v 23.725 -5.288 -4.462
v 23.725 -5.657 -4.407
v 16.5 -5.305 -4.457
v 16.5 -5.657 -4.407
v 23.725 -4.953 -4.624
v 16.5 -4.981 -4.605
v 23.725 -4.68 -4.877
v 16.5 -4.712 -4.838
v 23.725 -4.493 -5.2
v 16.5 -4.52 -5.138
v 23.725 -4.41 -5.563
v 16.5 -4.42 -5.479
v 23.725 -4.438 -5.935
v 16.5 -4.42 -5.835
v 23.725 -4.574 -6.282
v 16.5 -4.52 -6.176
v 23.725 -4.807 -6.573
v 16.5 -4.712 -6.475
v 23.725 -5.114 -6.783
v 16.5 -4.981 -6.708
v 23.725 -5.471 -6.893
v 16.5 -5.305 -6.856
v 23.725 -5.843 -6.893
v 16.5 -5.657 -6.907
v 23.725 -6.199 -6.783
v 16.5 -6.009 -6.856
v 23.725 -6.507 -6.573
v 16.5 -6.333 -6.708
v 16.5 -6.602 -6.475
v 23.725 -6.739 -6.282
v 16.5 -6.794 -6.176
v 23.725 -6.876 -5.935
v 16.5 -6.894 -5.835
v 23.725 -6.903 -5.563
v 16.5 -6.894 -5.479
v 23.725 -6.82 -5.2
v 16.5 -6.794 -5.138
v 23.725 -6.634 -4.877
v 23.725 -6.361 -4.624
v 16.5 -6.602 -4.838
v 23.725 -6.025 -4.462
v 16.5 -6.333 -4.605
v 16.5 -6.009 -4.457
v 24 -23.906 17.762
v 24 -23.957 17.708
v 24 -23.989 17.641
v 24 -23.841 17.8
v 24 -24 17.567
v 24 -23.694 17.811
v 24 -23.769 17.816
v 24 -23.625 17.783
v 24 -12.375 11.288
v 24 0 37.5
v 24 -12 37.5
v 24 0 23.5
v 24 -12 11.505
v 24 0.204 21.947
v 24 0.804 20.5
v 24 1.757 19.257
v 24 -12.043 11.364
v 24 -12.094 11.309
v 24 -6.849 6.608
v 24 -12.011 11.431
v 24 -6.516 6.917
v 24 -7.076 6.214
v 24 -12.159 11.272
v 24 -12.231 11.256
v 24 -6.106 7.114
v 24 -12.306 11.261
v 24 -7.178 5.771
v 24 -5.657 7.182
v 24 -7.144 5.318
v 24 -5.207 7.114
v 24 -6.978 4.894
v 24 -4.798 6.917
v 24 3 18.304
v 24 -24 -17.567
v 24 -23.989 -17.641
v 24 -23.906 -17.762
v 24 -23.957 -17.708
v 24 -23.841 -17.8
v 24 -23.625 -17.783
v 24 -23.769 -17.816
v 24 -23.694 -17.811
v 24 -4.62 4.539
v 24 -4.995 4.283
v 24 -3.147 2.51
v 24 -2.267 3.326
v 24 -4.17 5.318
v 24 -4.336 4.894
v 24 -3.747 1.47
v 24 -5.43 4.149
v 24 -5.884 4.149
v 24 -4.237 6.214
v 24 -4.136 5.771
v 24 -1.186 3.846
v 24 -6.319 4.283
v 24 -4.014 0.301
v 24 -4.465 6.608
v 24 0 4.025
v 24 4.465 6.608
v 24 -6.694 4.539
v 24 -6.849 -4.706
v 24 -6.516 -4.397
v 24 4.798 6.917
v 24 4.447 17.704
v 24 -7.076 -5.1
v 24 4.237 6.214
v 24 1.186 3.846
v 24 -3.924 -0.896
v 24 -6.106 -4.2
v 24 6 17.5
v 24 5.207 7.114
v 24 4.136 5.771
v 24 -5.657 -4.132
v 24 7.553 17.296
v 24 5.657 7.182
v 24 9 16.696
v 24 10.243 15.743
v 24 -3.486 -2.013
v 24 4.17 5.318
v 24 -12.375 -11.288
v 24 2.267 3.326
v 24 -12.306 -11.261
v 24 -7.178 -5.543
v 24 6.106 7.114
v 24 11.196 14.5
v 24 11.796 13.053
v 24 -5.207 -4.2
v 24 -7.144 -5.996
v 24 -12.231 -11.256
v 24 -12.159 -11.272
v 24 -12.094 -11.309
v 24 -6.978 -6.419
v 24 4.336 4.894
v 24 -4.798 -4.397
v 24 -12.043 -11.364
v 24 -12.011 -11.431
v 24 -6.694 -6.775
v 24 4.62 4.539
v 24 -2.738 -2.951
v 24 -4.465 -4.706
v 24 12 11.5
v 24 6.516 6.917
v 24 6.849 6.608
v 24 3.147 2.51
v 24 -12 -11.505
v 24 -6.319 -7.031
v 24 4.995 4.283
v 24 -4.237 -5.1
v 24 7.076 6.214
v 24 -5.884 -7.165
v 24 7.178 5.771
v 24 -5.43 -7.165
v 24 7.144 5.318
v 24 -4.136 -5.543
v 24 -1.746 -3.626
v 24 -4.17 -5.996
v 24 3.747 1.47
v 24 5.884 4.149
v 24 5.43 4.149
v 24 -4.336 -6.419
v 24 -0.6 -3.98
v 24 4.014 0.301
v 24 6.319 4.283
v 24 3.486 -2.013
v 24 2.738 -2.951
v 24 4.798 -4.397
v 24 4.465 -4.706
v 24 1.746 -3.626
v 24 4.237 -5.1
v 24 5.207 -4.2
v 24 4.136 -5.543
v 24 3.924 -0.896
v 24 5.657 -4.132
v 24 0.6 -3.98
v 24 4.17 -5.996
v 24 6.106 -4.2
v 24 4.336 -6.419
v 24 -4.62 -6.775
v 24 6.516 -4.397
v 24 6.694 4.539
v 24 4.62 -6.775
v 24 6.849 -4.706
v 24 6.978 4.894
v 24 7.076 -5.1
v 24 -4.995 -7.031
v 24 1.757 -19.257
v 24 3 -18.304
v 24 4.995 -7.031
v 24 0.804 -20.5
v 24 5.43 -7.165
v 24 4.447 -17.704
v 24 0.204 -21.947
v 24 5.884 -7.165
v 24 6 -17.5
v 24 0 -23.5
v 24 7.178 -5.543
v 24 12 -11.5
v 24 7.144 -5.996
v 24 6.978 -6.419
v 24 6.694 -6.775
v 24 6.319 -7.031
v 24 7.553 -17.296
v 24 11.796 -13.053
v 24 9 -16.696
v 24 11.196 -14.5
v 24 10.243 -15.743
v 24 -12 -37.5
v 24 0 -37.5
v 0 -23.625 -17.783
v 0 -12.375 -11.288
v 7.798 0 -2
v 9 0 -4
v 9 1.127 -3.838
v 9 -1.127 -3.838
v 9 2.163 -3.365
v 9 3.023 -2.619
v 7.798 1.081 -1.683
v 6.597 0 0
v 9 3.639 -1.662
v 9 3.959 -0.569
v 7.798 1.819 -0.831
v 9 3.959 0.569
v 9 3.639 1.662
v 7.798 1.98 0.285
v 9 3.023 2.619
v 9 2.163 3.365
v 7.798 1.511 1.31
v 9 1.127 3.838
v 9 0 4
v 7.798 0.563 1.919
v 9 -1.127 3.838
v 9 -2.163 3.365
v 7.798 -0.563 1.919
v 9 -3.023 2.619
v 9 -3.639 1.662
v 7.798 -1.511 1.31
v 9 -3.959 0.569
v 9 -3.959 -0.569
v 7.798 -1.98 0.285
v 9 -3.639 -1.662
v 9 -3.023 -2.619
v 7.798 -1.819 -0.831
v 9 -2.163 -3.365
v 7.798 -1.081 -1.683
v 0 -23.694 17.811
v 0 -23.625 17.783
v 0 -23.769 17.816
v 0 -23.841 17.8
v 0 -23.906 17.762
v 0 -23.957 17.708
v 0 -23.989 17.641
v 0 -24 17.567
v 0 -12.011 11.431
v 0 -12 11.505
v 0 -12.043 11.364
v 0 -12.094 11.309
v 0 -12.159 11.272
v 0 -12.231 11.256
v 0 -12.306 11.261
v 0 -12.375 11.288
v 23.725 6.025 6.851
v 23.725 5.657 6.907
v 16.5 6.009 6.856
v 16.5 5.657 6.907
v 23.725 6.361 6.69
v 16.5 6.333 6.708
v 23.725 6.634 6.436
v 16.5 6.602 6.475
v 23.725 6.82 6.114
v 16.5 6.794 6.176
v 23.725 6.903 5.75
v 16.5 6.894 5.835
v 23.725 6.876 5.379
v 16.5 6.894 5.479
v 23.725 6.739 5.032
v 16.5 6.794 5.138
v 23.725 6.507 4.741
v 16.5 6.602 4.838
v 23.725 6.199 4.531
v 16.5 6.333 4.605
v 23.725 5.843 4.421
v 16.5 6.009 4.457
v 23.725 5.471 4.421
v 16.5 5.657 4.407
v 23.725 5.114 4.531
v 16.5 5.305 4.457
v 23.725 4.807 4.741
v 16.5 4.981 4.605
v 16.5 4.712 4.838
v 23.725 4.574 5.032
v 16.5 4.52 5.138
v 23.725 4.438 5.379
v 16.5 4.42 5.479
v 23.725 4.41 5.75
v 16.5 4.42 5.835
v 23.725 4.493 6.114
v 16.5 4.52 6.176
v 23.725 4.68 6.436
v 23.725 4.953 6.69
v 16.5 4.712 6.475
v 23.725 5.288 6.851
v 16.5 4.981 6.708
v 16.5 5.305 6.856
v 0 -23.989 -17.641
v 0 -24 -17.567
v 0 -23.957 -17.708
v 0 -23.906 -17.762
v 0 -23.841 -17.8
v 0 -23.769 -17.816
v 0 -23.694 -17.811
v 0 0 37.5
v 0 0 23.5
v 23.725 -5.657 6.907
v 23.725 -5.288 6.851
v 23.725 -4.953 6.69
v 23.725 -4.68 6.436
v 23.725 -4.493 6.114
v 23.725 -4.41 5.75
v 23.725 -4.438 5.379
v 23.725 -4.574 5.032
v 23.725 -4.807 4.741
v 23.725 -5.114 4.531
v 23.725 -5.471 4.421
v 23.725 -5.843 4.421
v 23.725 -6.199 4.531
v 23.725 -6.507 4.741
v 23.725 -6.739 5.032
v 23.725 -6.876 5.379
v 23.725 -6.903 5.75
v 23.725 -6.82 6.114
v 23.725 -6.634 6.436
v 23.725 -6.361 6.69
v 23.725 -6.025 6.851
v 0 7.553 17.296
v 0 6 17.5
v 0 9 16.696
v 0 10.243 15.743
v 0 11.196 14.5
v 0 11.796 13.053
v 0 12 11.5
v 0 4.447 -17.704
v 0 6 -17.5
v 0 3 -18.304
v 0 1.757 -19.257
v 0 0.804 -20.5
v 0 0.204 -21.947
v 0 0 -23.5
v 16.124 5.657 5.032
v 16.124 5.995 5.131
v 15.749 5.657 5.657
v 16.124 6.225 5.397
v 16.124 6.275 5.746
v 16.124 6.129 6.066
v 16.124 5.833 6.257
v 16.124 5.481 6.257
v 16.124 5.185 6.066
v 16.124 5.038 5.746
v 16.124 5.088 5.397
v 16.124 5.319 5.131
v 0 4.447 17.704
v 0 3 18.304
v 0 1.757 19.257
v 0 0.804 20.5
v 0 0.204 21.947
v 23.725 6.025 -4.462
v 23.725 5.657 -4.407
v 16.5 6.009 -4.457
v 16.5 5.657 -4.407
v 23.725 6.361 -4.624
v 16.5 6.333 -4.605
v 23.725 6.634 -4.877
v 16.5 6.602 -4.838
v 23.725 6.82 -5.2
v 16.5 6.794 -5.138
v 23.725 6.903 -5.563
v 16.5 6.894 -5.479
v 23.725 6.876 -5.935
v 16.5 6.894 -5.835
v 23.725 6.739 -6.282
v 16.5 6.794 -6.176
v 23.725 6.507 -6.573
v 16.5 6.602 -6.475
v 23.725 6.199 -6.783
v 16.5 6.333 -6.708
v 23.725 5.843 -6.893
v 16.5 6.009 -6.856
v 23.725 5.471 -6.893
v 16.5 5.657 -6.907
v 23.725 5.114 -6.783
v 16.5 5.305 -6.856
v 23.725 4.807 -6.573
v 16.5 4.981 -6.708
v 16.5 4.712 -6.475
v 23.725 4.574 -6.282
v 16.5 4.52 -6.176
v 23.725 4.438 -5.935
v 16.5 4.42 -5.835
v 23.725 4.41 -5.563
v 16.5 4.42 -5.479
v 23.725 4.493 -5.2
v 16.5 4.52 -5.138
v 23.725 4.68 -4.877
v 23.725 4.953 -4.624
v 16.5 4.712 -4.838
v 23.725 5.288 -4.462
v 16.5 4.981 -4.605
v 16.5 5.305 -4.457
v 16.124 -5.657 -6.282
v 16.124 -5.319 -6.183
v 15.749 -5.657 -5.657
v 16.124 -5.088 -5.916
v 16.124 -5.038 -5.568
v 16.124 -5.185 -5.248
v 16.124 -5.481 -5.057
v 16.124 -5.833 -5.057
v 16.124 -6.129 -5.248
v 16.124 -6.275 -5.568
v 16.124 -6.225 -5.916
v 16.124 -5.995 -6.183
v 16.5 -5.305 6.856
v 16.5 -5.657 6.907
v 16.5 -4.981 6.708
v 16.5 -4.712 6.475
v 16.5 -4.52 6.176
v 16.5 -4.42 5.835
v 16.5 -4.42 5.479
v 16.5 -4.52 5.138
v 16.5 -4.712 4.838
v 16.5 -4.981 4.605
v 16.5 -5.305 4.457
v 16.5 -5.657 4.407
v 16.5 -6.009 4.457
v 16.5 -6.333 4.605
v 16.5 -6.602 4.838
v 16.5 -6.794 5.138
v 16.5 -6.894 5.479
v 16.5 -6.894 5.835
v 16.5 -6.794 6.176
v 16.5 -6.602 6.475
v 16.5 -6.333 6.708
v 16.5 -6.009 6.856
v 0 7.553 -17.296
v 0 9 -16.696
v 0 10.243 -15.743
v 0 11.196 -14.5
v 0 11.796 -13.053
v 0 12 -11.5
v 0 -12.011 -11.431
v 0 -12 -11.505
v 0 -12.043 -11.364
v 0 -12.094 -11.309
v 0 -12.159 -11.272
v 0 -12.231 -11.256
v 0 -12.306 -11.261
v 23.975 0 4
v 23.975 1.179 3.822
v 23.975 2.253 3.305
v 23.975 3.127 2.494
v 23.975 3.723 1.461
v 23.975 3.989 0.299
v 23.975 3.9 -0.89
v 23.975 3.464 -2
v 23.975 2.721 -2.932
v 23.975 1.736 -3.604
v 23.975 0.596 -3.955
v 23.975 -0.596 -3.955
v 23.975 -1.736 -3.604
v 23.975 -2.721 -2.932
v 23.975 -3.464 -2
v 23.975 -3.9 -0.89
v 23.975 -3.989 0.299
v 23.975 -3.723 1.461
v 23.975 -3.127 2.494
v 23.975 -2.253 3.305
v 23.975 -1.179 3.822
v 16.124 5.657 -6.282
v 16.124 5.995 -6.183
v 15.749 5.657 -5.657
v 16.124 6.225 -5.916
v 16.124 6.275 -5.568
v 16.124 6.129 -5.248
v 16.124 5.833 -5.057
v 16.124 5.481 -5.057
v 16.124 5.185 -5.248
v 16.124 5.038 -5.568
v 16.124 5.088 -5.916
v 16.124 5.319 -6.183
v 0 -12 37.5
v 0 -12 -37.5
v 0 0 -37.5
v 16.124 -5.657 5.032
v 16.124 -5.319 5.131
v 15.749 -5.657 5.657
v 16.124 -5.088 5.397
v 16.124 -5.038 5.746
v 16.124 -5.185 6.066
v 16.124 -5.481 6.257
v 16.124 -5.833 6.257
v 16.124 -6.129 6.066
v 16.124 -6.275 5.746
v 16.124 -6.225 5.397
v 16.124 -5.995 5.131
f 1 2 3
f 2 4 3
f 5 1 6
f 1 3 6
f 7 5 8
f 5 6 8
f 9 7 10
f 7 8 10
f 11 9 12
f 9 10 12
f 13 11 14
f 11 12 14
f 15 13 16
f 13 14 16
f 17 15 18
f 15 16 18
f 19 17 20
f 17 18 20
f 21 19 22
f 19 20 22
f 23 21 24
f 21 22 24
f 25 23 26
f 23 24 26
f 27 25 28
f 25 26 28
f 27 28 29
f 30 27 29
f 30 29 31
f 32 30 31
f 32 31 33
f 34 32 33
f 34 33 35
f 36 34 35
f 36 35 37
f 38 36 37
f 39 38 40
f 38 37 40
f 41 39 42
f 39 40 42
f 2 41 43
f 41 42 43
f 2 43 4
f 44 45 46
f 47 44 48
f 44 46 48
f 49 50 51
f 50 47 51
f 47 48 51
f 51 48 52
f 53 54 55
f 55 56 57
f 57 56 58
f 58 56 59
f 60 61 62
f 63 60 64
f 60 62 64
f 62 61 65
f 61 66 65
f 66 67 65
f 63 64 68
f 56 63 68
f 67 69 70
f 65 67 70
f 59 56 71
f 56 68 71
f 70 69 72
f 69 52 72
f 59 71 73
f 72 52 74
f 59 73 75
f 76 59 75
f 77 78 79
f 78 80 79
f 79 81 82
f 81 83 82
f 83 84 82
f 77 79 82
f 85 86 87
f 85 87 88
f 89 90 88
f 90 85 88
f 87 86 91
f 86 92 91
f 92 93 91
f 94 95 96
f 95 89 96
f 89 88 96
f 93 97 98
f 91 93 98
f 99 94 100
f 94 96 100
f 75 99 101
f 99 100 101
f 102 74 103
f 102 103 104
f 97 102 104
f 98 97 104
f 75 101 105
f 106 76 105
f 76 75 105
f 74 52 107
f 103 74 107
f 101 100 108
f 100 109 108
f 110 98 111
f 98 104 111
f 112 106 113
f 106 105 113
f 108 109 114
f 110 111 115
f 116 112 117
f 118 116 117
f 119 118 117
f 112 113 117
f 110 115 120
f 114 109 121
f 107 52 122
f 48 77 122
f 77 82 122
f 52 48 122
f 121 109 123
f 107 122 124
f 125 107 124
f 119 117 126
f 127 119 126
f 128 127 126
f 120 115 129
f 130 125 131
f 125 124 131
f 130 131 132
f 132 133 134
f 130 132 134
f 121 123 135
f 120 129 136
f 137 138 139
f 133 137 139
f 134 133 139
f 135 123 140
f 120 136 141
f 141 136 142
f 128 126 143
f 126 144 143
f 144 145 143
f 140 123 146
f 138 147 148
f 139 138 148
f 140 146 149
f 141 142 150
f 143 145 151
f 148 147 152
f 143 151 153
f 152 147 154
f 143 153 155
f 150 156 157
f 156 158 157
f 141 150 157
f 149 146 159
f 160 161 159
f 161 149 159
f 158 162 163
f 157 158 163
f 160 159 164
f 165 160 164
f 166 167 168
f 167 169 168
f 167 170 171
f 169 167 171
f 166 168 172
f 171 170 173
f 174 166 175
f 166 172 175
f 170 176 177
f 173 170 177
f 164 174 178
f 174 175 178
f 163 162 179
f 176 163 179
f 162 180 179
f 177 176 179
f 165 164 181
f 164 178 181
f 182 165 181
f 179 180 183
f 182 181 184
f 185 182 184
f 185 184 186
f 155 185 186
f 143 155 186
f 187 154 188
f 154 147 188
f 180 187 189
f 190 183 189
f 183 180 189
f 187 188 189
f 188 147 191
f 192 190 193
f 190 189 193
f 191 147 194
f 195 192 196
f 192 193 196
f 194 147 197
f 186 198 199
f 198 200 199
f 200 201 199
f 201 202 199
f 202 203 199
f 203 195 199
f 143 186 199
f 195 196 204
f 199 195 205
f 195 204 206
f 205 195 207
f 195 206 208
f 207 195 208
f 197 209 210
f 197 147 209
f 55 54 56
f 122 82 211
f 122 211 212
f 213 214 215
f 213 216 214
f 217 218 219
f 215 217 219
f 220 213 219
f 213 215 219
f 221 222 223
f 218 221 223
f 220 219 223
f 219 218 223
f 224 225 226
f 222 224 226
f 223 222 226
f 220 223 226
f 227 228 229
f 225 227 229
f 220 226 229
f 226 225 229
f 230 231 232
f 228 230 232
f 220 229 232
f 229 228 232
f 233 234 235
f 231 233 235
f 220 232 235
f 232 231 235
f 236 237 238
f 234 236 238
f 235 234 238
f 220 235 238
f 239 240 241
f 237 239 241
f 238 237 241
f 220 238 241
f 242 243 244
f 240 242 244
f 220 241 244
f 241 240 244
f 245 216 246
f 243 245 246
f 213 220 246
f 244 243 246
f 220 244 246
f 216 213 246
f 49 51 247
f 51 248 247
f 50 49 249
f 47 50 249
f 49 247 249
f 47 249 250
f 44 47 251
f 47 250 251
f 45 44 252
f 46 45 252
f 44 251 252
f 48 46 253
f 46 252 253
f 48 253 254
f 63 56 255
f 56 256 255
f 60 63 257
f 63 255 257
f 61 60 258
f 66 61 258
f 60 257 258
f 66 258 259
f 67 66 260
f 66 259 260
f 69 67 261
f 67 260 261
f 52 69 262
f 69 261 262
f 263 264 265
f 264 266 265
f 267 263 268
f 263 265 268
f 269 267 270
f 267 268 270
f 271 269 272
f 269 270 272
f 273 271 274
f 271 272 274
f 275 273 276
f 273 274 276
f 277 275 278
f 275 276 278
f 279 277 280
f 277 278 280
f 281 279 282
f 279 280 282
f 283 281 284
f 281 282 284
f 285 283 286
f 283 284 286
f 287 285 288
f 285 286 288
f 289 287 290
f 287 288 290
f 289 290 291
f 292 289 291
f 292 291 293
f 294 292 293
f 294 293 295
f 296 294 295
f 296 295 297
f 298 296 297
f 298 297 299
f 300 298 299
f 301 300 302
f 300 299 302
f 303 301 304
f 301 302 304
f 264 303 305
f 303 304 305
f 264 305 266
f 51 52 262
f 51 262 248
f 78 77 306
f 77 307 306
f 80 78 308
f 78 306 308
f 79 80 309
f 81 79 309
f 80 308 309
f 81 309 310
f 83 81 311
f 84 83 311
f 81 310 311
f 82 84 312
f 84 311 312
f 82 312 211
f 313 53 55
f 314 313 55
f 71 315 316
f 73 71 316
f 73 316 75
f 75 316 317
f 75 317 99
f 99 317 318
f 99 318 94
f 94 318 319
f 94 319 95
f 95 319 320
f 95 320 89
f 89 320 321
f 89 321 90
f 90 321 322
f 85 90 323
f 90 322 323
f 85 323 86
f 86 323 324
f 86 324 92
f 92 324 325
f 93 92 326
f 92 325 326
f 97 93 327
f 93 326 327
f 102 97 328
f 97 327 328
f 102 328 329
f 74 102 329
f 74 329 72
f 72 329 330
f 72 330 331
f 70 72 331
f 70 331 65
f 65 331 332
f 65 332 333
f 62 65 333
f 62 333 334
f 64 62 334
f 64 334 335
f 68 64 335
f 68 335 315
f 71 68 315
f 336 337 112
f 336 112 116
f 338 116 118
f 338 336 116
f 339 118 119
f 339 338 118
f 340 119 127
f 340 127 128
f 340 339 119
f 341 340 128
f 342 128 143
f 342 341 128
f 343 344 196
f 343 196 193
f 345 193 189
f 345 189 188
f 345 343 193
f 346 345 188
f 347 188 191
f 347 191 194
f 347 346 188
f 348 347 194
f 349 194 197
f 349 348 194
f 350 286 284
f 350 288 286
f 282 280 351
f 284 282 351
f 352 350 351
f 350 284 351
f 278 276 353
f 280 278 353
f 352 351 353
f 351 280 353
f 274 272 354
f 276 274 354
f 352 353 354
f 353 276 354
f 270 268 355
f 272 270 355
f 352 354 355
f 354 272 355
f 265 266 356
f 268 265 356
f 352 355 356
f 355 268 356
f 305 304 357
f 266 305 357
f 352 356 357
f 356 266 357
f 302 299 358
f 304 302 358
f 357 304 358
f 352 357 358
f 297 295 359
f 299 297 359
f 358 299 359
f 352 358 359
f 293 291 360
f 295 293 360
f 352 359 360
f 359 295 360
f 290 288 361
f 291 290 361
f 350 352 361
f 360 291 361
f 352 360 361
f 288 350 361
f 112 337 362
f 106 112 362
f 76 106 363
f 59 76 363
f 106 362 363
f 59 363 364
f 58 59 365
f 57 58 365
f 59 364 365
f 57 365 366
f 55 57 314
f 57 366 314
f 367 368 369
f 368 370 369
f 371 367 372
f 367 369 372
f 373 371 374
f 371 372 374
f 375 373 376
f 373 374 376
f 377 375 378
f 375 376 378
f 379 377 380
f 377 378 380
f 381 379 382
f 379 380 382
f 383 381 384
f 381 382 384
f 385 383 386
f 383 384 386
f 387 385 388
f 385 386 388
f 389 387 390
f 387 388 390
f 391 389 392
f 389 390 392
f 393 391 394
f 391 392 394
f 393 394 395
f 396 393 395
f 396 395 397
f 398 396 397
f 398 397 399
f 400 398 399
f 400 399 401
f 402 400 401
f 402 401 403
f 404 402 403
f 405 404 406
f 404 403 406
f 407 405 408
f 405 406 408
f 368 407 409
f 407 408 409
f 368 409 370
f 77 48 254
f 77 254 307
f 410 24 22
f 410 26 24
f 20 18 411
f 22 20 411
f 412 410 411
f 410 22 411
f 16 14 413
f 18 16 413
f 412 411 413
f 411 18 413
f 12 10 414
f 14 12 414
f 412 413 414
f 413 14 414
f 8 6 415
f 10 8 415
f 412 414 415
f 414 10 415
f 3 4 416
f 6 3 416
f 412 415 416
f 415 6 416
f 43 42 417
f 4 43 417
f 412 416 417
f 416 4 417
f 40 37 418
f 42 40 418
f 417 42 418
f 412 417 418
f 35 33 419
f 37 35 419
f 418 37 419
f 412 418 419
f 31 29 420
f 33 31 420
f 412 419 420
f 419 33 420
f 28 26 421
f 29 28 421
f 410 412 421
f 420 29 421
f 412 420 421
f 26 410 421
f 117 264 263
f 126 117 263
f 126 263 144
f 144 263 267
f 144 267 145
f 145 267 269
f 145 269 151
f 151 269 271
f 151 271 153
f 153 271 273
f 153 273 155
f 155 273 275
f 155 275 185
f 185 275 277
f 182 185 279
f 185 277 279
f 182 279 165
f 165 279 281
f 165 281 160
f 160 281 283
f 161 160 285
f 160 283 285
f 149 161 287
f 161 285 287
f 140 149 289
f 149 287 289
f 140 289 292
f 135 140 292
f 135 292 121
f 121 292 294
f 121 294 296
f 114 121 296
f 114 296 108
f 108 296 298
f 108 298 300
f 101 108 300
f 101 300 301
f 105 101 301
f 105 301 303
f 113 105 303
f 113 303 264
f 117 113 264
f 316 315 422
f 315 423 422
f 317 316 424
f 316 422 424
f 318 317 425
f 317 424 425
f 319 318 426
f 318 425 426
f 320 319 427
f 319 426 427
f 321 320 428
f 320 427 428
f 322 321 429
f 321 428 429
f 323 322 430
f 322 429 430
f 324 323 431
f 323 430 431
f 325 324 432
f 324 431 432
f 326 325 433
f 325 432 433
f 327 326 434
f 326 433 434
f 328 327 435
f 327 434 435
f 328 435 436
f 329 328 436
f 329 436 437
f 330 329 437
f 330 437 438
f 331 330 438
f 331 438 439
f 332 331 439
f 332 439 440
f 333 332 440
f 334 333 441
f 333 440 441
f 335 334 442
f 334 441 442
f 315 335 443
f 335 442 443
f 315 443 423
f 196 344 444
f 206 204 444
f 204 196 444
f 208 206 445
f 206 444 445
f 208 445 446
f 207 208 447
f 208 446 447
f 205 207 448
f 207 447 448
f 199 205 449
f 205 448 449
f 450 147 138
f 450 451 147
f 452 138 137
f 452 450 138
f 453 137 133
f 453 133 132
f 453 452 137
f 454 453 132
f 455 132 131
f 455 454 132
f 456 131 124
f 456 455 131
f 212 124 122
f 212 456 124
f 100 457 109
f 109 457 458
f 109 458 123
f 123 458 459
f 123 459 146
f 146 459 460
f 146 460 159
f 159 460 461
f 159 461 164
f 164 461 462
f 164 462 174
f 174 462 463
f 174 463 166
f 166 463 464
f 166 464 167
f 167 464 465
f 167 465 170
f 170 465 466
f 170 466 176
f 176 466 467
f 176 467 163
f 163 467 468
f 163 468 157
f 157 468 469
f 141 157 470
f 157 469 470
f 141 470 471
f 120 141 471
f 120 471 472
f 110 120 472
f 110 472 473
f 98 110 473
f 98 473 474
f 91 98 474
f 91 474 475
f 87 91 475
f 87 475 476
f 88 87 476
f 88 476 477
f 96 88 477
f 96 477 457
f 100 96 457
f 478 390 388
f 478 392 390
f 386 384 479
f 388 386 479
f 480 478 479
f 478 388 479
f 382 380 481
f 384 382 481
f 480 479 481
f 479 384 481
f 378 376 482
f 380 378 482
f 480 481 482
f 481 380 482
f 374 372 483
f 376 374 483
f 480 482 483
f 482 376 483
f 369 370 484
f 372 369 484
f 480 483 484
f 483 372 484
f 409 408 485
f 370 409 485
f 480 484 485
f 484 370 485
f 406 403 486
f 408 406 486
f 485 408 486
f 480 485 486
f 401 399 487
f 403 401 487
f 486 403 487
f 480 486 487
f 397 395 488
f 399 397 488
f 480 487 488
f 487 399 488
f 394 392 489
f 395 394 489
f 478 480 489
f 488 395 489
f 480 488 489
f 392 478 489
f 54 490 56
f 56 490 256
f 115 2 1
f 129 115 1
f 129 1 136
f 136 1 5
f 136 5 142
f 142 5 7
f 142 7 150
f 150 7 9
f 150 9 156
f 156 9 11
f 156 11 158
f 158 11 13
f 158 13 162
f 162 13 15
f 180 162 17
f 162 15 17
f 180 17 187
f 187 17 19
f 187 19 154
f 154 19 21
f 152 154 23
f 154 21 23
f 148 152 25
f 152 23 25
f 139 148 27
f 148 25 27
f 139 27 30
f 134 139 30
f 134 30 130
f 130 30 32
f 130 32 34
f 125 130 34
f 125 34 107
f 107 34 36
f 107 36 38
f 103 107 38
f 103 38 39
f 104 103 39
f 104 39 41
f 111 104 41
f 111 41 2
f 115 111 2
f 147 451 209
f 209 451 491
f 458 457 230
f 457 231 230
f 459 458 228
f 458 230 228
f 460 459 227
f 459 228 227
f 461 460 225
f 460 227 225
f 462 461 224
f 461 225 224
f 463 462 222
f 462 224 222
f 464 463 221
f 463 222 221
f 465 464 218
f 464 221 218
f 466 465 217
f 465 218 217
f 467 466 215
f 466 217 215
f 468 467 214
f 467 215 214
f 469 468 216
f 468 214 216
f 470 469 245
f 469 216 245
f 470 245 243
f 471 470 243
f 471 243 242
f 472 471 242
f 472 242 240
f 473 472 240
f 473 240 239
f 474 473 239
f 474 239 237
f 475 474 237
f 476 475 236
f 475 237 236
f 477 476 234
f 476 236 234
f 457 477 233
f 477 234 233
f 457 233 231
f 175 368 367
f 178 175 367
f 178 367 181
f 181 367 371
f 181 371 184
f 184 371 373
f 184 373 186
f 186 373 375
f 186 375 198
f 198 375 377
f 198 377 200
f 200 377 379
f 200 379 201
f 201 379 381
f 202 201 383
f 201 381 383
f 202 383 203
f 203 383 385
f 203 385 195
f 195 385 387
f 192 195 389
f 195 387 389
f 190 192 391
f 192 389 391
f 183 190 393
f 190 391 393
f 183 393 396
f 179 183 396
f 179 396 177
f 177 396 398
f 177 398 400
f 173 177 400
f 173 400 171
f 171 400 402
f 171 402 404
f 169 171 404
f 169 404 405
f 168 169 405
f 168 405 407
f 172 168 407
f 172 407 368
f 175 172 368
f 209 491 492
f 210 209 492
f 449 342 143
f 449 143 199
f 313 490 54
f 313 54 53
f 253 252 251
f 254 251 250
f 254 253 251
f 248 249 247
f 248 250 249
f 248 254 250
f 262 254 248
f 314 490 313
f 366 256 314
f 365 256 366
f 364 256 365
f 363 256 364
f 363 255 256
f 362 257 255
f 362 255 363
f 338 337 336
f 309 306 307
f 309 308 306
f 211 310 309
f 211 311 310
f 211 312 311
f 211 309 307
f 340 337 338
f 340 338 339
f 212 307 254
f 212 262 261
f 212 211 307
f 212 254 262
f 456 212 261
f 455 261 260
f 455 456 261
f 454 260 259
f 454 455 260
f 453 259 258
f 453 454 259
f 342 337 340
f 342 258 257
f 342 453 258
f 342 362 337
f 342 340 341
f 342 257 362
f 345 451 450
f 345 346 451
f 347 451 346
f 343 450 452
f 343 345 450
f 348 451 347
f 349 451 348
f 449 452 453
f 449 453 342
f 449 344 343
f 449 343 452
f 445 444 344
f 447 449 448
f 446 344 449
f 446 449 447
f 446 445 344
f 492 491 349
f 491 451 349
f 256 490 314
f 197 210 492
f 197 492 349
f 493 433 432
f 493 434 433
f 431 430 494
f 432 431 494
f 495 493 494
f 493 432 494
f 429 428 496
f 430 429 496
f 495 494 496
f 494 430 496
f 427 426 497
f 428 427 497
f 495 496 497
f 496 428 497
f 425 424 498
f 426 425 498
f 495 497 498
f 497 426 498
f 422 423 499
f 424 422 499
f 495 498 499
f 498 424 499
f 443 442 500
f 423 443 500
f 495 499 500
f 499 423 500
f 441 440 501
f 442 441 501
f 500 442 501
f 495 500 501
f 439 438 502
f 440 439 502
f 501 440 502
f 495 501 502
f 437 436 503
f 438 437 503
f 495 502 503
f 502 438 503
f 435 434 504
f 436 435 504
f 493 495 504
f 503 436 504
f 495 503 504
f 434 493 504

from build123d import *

# Parameters (mm, degrees)
SKETCH1_W                       = 75
SKETCH1_H                       = 24
BOSS_EXTRUDE1_DEPTH             = 24
SKETCH2_W                       = 20
SKETCH2_H                       = 12
CUT_EXTRUDE1_DEPTH              = 24
FILLET1_START                   = -1
FILLET1_DEPTH                   = 26
FILLET1_2_DEPTH                 = 24
F_8_0MM_DOWEL_HOLE1_D           = 8
F_8_0MM_DOWEL_HOLE1_DEPTH       = 15
F_8_0MM_DOWEL_HOLE1_CSINK_D     = 8.05
F_8_0MM_DOWEL_HOLE1_CSINK_ANGLE = 90
F_8_0MM_DOWEL_HOLE1_TIP         = 2.403442476
M3X0_5_TAPPED_HOLE1_D           = 2.5
M3X0_5_TAPPED_HOLE1_DEPTH       = 7.5
M3X0_5_TAPPED_HOLE1_CSINK_D     = 3.05
M3X0_5_TAPPED_HOLE1_CSINK_ANGLE = 90
M3X0_5_TAPPED_HOLE1_TIP         = 0.751075774
BOSS_EXTRUDE2_DEPTH             = 24
FILLET2_R                       = 0.25


with BuildPart() as part:
    # Sketch1 → Boss-Extrude1 (new body)
    with BuildSketch(Plane(origin=(0, 0, 0), x_dir=(0, 0, -1), z_dir=(1, 0, 0))):
        Rectangle(SKETCH1_W, SKETCH1_H)
    extrude(amount=BOSS_EXTRUDE1_DEPTH)

    # Sketch2 → Cut-Extrude1 (cut)
    with BuildSketch(Plane(origin=(24, 0, 0), x_dir=(0, 0, -1), z_dir=(1, 0, 0))):
        with Locations((-27.5, 6)):
            Rectangle(SKETCH2_W, SKETCH2_H)
    cut_extrude1 = extrude(amount=-CUT_EXTRUDE1_DEPTH, mode=Mode.SUBTRACT)

    # Fillet1: read off the stored shape, not the designer's step
    # Fillet1 outline → Fillet1 (cut)
    with BuildSketch(Plane.YZ.offset(FILLET1_START)):
        with BuildLine():
            Line((12, 17.5), (6, 17.5))
            ThreePointArc((6, 17.5), (10.242640687, 15.742640687), (12, 11.5))
            Line((12, 11.5), (12, 17.5))
        make_face()
    fillet1 = extrude(amount=FILLET1_DEPTH, mode=Mode.SUBTRACT)

    # Fillet1 2 outline → Fillet1 2 (add)
    with BuildSketch(Plane.YZ):
        with BuildLine():
            Line((0, 17.5), (6, 17.5))
            ThreePointArc((6, 17.5), (1.757359313, 19.257359313), (0, 23.5))
            Line((0, 23.5), (0, 17.5))
        make_face()
    fillet1_2 = extrude(amount=FILLET1_2_DEPTH)

    # Mirror1: Cut-Extrude1, Fillet1, Fillet1 2 across plane
    add(cut_extrude1.mirror(Plane.XY), mode=Mode.SUBTRACT)
    add(fillet1.mirror(Plane.XY), mode=Mode.SUBTRACT)
    add(fillet1_2.mirror(Plane.XY))

    # Ø8.0mm Dowel Hole1
    with Locations(Plane(origin=(24, 0, 0), x_dir=(0, 0, -1), z_dir=(1, 0, 0))):
        with Locations((0, 0)):
            CounterSinkHole(F_8_0MM_DOWEL_HOLE1_D / 2, F_8_0MM_DOWEL_HOLE1_CSINK_D / 2, depth=F_8_0MM_DOWEL_HOLE1_DEPTH, counter_sink_angle=F_8_0MM_DOWEL_HOLE1_CSINK_ANGLE)
            with Locations((0, 0, -(F_8_0MM_DOWEL_HOLE1_DEPTH + F_8_0MM_DOWEL_HOLE1_TIP / 2))):  # 118° drill point
                Cone(0, F_8_0MM_DOWEL_HOLE1_D / 2, F_8_0MM_DOWEL_HOLE1_TIP, mode=Mode.SUBTRACT)

    # M3x0.5 Tapped Hole1
    with Locations(Plane(origin=(24, 0, 0), x_dir=(0, 0, -1), z_dir=(1, 0, 0))):
        with Locations((-5.656854249, 5.656854249), (5.656854249, 5.656854249), (5.656854249, -5.656854249), (-5.656854249, -5.656854249)):
            CounterSinkHole(M3X0_5_TAPPED_HOLE1_D / 2, M3X0_5_TAPPED_HOLE1_CSINK_D / 2, depth=M3X0_5_TAPPED_HOLE1_DEPTH, counter_sink_angle=M3X0_5_TAPPED_HOLE1_CSINK_ANGLE)
            with Locations((0, 0, -(M3X0_5_TAPPED_HOLE1_DEPTH + M3X0_5_TAPPED_HOLE1_TIP / 2))):  # 118° drill point
                Cone(0, M3X0_5_TAPPED_HOLE1_D / 2, M3X0_5_TAPPED_HOLE1_TIP, mode=Mode.SUBTRACT)

    # Sketch12 → Boss-Extrude2 (add)
    with BuildSketch(Plane(origin=(24, 0, 0), x_dir=(0, 0, -1), z_dir=(1, 0, 0))):
        Polygon((-18, -24), (18, -24), (11.07179677, -12), (-11.07179677, -12), align=None)
    extrude(amount=-BOSS_EXTRUDE2_DEPTH)

    # Fillet2
    fillet2_edges = [part.edges().sort_by_distance(p)[0] for p in [
        (12, -12, 11.07179677),
        (12, -24, 18),
        (12, -24, -18),
        (12, -12, -11.07179677),
    ]]
    fillet(fillet2_edges, radius=FILLET2_R)


solid = part.part
